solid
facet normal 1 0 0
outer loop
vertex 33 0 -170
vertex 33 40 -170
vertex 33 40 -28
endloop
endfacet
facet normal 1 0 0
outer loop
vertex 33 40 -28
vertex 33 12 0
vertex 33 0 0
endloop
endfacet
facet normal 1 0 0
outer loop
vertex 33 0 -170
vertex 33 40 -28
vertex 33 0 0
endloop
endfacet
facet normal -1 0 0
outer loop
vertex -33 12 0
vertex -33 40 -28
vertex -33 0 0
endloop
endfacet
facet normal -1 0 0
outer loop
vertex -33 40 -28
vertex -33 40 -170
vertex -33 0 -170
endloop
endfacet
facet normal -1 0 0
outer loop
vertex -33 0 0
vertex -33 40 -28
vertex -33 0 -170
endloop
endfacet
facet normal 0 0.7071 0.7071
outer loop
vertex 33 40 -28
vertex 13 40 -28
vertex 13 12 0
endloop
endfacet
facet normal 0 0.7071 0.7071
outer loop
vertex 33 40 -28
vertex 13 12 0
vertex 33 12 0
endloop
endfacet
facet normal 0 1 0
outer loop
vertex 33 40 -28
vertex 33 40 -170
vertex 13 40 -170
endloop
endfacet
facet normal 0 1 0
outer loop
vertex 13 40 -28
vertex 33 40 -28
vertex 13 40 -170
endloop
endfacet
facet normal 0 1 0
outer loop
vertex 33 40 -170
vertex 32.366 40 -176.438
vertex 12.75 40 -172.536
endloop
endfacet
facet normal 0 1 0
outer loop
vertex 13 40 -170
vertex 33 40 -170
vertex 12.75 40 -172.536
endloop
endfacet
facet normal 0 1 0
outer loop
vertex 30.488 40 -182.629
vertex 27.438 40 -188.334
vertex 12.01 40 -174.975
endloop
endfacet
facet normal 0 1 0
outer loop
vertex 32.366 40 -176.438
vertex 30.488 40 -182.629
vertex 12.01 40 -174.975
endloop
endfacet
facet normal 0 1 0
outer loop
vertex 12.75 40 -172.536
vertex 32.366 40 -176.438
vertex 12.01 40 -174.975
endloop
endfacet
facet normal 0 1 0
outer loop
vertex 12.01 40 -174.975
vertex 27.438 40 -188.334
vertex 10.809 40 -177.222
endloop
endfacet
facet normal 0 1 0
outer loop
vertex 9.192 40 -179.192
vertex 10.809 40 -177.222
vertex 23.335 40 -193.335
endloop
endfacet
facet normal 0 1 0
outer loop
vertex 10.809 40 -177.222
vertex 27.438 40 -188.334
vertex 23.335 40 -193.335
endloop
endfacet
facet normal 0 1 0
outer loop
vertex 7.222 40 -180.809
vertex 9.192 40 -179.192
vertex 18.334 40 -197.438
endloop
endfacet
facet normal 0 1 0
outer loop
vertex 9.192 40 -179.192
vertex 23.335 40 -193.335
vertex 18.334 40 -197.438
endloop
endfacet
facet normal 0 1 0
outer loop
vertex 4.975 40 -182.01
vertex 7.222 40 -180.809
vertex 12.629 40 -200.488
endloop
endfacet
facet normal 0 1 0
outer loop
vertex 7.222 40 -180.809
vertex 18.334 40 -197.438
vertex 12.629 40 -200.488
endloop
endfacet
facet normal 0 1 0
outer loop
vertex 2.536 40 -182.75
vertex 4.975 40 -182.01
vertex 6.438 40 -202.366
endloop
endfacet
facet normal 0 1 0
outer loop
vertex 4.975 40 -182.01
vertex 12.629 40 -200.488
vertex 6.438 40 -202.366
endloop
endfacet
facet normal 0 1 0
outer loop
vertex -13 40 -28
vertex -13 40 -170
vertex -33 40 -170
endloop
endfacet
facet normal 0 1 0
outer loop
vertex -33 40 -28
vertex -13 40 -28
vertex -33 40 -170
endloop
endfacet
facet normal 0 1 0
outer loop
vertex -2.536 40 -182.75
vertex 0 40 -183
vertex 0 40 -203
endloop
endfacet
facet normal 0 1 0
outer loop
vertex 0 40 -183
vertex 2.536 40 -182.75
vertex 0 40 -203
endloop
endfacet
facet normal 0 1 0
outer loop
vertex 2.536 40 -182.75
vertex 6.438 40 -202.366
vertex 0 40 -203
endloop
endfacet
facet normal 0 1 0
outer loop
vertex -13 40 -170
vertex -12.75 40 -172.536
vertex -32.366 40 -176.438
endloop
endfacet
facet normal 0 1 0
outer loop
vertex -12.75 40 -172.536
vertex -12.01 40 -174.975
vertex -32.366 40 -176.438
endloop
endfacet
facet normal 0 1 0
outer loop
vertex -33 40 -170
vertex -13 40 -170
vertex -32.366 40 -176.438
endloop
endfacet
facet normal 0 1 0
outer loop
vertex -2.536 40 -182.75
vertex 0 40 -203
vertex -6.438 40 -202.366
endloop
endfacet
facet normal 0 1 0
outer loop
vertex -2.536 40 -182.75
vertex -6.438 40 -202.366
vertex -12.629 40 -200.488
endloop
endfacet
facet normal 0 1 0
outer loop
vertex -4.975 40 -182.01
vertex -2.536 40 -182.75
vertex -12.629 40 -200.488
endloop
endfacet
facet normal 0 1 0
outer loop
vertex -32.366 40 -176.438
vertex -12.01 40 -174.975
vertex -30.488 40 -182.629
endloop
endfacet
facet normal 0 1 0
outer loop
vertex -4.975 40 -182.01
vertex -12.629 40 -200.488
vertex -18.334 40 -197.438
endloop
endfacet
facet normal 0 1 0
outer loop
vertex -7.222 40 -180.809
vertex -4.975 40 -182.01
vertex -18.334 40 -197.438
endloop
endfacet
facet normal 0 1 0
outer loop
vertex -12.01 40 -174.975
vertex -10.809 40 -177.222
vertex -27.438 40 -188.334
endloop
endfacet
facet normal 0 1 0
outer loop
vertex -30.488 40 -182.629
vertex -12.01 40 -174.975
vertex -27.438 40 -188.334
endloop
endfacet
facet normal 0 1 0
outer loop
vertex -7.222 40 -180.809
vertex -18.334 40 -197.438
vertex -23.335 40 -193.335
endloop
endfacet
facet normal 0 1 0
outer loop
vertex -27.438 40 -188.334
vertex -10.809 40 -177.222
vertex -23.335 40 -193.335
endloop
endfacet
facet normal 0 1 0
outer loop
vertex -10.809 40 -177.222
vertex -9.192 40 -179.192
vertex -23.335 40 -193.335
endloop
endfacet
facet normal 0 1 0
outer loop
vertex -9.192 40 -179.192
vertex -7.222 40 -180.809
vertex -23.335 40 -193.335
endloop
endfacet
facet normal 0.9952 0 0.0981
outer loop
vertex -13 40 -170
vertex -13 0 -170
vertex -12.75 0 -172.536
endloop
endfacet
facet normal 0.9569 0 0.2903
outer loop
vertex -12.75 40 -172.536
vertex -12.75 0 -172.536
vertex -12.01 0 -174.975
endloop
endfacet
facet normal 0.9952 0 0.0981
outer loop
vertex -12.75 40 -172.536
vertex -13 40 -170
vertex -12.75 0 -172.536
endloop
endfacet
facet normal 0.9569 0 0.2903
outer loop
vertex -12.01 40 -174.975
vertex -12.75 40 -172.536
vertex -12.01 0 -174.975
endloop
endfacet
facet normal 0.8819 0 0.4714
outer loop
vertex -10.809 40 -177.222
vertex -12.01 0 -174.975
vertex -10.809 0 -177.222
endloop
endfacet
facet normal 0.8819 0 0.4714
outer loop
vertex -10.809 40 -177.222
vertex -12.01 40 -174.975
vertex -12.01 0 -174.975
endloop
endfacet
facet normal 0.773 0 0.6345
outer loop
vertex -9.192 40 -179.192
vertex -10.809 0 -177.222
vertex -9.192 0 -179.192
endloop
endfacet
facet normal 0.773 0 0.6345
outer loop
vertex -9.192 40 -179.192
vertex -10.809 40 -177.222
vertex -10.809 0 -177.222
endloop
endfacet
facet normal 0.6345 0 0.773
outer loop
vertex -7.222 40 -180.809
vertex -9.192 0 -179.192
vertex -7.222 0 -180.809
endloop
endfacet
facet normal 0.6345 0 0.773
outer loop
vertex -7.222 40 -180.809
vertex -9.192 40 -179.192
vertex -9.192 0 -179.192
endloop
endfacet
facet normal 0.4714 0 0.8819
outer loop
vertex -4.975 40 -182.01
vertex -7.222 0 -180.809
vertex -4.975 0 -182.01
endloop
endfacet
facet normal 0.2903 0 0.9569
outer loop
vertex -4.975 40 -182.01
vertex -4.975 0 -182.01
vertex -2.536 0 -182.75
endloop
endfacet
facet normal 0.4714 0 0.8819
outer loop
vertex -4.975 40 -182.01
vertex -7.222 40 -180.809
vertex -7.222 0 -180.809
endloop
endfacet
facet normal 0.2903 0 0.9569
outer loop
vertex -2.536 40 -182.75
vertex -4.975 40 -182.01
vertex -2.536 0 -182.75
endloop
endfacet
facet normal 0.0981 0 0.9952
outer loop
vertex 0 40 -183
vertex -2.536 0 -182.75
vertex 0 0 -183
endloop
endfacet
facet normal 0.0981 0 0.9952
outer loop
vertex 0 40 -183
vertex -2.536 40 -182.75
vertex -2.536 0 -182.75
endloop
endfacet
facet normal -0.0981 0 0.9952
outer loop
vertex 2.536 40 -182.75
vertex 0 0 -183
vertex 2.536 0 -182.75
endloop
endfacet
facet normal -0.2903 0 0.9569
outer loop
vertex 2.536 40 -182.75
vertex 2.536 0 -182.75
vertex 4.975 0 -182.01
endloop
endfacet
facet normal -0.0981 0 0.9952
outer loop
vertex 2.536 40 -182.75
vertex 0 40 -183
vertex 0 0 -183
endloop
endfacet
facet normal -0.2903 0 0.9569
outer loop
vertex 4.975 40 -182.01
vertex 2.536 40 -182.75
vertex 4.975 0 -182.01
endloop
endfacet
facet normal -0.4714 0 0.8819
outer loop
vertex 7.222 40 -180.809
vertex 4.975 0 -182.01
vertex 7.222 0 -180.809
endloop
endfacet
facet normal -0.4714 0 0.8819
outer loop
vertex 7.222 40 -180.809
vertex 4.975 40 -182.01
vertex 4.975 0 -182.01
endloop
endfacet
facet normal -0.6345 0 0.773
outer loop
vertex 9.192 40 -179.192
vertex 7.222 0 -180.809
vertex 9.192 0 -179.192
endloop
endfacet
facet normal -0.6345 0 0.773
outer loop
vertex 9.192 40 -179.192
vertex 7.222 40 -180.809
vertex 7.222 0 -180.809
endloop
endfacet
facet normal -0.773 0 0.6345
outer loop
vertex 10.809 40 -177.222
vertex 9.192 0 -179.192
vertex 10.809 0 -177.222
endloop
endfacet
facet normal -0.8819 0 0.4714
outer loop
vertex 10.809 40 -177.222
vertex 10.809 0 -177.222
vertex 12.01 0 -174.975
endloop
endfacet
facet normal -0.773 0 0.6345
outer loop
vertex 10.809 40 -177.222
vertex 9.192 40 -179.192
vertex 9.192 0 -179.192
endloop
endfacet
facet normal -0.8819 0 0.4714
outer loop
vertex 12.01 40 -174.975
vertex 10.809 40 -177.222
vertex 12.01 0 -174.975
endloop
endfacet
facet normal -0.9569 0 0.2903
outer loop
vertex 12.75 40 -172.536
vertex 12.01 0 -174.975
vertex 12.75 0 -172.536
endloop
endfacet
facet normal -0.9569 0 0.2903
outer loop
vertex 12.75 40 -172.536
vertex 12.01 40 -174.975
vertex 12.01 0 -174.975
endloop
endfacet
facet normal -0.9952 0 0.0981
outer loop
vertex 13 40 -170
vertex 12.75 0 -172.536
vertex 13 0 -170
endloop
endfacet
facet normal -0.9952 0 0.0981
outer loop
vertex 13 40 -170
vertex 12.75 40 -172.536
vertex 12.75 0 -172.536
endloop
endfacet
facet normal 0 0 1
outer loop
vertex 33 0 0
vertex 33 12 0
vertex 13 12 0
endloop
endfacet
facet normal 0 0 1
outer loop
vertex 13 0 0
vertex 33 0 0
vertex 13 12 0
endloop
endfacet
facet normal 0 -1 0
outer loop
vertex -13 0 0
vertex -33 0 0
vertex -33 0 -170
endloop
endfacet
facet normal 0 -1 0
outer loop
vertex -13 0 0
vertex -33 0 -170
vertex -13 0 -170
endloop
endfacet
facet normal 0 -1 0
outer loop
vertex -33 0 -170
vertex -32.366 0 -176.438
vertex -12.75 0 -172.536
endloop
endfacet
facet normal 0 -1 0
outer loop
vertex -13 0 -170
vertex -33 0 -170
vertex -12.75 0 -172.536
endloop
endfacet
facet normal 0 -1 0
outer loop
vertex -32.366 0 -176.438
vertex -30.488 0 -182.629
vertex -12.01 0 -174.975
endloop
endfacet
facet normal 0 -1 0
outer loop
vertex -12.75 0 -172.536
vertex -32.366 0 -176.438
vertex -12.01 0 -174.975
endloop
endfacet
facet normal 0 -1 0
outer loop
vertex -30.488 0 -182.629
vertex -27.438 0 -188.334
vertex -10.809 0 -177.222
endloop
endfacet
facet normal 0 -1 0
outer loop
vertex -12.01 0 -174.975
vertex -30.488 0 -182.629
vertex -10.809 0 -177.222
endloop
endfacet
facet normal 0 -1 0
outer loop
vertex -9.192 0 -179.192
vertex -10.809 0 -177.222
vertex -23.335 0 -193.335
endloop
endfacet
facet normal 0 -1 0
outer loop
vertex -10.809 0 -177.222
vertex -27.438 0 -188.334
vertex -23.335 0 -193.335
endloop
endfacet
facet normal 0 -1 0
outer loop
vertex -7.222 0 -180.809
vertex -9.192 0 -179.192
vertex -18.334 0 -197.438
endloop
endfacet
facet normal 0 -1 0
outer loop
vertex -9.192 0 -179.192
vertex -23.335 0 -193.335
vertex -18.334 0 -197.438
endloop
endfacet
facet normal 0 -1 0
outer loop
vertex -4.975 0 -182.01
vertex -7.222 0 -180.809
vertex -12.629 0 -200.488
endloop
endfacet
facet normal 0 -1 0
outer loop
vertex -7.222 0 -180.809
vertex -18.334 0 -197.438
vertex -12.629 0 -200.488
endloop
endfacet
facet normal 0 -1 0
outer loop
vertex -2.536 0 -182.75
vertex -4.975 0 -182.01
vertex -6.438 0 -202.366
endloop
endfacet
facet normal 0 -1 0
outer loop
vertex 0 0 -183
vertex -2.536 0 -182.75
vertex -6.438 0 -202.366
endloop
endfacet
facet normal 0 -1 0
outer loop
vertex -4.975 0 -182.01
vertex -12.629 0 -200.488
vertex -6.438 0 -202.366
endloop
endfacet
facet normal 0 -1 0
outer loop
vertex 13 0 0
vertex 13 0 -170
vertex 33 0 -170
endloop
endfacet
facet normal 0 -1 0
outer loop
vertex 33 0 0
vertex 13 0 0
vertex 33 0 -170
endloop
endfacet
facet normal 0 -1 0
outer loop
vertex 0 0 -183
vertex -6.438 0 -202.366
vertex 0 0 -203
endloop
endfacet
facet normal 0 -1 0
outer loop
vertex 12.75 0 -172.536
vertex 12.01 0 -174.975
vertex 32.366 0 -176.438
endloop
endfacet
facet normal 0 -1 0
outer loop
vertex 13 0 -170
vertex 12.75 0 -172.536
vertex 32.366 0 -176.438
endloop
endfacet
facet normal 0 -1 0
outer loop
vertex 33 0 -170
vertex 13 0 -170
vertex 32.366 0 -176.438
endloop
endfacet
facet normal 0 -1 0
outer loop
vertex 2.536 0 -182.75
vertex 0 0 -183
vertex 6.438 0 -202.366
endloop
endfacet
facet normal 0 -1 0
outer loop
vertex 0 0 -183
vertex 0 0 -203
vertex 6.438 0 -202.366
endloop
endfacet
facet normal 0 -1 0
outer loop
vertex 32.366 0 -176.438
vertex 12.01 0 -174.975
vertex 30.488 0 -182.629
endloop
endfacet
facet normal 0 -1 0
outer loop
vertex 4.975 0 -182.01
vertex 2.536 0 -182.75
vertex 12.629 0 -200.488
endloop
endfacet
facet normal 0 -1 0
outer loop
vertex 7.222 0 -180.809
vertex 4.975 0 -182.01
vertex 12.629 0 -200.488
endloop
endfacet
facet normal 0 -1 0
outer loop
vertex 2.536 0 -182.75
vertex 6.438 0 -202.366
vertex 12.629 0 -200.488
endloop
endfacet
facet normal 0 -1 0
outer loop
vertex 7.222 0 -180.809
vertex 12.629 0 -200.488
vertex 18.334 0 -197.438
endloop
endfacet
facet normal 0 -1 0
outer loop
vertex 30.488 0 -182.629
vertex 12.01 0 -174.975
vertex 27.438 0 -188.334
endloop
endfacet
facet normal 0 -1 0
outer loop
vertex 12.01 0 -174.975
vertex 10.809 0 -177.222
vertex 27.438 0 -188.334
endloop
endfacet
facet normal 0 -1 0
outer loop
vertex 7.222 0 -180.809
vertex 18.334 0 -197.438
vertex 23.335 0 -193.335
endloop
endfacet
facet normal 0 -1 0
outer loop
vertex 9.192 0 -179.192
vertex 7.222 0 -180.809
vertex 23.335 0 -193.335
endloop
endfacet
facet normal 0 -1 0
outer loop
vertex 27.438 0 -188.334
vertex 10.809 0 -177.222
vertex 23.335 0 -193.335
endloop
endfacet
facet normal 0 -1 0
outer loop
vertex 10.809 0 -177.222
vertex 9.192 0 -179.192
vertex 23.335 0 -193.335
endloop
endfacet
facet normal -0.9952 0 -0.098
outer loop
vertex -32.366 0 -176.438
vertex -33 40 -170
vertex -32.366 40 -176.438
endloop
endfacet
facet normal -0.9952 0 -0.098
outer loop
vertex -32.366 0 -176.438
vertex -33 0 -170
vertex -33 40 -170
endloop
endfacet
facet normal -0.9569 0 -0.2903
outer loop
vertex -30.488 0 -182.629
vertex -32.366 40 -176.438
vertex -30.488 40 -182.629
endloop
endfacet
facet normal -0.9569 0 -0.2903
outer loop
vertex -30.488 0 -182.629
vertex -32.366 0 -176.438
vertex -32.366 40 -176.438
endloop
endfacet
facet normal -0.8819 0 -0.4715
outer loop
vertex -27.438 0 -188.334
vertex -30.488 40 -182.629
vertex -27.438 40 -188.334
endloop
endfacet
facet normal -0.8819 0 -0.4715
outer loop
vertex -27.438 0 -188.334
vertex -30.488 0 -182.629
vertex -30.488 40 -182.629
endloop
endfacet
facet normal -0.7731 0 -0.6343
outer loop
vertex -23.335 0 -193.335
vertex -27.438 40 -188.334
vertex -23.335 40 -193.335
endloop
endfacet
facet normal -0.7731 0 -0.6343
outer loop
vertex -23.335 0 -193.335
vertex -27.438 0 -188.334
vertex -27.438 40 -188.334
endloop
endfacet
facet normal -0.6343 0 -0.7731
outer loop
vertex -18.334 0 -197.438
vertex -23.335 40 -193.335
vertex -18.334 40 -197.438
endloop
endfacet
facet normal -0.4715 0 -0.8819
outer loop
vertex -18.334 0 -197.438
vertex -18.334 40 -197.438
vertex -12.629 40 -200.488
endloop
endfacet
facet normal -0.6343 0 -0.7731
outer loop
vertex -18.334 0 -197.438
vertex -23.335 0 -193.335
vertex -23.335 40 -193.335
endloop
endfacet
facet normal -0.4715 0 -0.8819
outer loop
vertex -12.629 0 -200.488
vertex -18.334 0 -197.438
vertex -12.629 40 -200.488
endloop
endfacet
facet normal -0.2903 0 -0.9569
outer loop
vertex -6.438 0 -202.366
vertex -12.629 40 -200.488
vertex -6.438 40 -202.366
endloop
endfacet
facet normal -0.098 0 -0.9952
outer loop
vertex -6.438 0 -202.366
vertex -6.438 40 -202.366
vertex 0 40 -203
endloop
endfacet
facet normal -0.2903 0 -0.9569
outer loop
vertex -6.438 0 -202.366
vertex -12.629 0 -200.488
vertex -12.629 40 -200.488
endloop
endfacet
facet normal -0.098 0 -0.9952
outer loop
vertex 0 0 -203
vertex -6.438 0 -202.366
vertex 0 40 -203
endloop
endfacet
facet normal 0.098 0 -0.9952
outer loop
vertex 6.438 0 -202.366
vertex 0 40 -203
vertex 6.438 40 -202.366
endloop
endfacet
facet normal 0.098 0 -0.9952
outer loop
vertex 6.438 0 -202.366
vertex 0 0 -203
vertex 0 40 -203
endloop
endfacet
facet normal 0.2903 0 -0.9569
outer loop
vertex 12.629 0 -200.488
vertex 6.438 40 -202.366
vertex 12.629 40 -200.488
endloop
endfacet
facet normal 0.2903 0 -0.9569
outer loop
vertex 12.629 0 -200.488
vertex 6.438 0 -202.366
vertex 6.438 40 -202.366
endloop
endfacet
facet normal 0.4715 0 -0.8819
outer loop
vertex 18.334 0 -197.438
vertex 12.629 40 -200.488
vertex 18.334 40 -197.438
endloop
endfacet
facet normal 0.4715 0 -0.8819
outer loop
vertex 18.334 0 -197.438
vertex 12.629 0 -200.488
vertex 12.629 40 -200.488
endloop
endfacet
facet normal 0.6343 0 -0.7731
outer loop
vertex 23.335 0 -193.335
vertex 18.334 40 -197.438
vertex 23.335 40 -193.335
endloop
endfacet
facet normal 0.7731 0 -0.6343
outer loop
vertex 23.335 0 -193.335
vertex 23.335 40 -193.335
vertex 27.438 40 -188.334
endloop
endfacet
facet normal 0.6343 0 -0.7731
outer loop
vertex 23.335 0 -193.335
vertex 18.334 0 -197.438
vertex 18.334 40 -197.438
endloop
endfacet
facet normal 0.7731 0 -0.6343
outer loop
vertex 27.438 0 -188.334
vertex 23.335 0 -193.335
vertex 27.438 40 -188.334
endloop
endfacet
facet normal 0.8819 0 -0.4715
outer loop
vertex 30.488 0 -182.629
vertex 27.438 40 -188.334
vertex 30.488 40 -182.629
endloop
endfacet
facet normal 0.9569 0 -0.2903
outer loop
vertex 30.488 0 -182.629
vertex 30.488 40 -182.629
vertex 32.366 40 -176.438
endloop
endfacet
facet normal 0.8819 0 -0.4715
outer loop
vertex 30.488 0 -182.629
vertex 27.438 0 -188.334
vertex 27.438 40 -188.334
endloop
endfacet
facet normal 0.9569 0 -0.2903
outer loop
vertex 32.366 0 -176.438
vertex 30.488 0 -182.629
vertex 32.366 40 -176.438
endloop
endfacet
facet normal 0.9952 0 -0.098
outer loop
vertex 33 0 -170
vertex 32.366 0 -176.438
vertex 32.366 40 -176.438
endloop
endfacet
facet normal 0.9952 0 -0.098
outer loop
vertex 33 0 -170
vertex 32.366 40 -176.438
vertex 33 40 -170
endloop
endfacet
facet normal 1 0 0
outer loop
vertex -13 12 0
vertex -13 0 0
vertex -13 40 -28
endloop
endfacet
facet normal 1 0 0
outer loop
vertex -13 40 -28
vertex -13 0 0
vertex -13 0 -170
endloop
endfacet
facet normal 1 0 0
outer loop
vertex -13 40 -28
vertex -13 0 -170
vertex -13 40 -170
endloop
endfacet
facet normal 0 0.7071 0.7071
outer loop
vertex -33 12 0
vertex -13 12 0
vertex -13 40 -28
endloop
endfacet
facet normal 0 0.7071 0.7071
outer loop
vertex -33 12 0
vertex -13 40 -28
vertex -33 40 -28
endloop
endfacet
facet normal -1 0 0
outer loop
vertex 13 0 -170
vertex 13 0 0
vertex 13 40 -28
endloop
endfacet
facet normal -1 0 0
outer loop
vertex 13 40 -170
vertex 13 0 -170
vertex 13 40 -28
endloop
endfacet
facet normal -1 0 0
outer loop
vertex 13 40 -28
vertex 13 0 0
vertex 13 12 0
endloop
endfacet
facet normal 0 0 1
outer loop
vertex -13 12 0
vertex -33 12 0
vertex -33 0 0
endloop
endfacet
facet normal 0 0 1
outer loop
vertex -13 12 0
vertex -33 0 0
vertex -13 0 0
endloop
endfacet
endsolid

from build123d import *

# Parameters (mm, degrees)
SKETCH1_W     = 20
SKETCH1_H     = 40
CHAMFER1_SIZE = 28


with BuildPart() as part:
    # Sweep1: sweep along a path in Sketch2
    with BuildLine(Plane(origin=(0, 0, 0), x_dir=(1, 0, 0), z_dir=(0, 1, 0))) as sweep1_path:
        Line((-13, 0), (-13, 170))
        ThreePointArc((-13, 170), (0, 183), (13, 170))
        Line((13, 170), (13, 0))
    # Sketch1 → Sweep1 (sweep)
    with BuildSketch(Plane.XY):
        with Locations((-23, 20)):
            Rectangle(SKETCH1_W, SKETCH1_H)
    sweep(path=sweep1_path.line)

    # Chamfer1
    chamfer1_edges = [part.edges().sort_by_distance(p)[0] for p in [
        (-23, 40, 0),
        (23, 40, 0),
    ]]
    chamfer(chamfer1_edges, length=CHAMFER1_SIZE)


solid = part.part
